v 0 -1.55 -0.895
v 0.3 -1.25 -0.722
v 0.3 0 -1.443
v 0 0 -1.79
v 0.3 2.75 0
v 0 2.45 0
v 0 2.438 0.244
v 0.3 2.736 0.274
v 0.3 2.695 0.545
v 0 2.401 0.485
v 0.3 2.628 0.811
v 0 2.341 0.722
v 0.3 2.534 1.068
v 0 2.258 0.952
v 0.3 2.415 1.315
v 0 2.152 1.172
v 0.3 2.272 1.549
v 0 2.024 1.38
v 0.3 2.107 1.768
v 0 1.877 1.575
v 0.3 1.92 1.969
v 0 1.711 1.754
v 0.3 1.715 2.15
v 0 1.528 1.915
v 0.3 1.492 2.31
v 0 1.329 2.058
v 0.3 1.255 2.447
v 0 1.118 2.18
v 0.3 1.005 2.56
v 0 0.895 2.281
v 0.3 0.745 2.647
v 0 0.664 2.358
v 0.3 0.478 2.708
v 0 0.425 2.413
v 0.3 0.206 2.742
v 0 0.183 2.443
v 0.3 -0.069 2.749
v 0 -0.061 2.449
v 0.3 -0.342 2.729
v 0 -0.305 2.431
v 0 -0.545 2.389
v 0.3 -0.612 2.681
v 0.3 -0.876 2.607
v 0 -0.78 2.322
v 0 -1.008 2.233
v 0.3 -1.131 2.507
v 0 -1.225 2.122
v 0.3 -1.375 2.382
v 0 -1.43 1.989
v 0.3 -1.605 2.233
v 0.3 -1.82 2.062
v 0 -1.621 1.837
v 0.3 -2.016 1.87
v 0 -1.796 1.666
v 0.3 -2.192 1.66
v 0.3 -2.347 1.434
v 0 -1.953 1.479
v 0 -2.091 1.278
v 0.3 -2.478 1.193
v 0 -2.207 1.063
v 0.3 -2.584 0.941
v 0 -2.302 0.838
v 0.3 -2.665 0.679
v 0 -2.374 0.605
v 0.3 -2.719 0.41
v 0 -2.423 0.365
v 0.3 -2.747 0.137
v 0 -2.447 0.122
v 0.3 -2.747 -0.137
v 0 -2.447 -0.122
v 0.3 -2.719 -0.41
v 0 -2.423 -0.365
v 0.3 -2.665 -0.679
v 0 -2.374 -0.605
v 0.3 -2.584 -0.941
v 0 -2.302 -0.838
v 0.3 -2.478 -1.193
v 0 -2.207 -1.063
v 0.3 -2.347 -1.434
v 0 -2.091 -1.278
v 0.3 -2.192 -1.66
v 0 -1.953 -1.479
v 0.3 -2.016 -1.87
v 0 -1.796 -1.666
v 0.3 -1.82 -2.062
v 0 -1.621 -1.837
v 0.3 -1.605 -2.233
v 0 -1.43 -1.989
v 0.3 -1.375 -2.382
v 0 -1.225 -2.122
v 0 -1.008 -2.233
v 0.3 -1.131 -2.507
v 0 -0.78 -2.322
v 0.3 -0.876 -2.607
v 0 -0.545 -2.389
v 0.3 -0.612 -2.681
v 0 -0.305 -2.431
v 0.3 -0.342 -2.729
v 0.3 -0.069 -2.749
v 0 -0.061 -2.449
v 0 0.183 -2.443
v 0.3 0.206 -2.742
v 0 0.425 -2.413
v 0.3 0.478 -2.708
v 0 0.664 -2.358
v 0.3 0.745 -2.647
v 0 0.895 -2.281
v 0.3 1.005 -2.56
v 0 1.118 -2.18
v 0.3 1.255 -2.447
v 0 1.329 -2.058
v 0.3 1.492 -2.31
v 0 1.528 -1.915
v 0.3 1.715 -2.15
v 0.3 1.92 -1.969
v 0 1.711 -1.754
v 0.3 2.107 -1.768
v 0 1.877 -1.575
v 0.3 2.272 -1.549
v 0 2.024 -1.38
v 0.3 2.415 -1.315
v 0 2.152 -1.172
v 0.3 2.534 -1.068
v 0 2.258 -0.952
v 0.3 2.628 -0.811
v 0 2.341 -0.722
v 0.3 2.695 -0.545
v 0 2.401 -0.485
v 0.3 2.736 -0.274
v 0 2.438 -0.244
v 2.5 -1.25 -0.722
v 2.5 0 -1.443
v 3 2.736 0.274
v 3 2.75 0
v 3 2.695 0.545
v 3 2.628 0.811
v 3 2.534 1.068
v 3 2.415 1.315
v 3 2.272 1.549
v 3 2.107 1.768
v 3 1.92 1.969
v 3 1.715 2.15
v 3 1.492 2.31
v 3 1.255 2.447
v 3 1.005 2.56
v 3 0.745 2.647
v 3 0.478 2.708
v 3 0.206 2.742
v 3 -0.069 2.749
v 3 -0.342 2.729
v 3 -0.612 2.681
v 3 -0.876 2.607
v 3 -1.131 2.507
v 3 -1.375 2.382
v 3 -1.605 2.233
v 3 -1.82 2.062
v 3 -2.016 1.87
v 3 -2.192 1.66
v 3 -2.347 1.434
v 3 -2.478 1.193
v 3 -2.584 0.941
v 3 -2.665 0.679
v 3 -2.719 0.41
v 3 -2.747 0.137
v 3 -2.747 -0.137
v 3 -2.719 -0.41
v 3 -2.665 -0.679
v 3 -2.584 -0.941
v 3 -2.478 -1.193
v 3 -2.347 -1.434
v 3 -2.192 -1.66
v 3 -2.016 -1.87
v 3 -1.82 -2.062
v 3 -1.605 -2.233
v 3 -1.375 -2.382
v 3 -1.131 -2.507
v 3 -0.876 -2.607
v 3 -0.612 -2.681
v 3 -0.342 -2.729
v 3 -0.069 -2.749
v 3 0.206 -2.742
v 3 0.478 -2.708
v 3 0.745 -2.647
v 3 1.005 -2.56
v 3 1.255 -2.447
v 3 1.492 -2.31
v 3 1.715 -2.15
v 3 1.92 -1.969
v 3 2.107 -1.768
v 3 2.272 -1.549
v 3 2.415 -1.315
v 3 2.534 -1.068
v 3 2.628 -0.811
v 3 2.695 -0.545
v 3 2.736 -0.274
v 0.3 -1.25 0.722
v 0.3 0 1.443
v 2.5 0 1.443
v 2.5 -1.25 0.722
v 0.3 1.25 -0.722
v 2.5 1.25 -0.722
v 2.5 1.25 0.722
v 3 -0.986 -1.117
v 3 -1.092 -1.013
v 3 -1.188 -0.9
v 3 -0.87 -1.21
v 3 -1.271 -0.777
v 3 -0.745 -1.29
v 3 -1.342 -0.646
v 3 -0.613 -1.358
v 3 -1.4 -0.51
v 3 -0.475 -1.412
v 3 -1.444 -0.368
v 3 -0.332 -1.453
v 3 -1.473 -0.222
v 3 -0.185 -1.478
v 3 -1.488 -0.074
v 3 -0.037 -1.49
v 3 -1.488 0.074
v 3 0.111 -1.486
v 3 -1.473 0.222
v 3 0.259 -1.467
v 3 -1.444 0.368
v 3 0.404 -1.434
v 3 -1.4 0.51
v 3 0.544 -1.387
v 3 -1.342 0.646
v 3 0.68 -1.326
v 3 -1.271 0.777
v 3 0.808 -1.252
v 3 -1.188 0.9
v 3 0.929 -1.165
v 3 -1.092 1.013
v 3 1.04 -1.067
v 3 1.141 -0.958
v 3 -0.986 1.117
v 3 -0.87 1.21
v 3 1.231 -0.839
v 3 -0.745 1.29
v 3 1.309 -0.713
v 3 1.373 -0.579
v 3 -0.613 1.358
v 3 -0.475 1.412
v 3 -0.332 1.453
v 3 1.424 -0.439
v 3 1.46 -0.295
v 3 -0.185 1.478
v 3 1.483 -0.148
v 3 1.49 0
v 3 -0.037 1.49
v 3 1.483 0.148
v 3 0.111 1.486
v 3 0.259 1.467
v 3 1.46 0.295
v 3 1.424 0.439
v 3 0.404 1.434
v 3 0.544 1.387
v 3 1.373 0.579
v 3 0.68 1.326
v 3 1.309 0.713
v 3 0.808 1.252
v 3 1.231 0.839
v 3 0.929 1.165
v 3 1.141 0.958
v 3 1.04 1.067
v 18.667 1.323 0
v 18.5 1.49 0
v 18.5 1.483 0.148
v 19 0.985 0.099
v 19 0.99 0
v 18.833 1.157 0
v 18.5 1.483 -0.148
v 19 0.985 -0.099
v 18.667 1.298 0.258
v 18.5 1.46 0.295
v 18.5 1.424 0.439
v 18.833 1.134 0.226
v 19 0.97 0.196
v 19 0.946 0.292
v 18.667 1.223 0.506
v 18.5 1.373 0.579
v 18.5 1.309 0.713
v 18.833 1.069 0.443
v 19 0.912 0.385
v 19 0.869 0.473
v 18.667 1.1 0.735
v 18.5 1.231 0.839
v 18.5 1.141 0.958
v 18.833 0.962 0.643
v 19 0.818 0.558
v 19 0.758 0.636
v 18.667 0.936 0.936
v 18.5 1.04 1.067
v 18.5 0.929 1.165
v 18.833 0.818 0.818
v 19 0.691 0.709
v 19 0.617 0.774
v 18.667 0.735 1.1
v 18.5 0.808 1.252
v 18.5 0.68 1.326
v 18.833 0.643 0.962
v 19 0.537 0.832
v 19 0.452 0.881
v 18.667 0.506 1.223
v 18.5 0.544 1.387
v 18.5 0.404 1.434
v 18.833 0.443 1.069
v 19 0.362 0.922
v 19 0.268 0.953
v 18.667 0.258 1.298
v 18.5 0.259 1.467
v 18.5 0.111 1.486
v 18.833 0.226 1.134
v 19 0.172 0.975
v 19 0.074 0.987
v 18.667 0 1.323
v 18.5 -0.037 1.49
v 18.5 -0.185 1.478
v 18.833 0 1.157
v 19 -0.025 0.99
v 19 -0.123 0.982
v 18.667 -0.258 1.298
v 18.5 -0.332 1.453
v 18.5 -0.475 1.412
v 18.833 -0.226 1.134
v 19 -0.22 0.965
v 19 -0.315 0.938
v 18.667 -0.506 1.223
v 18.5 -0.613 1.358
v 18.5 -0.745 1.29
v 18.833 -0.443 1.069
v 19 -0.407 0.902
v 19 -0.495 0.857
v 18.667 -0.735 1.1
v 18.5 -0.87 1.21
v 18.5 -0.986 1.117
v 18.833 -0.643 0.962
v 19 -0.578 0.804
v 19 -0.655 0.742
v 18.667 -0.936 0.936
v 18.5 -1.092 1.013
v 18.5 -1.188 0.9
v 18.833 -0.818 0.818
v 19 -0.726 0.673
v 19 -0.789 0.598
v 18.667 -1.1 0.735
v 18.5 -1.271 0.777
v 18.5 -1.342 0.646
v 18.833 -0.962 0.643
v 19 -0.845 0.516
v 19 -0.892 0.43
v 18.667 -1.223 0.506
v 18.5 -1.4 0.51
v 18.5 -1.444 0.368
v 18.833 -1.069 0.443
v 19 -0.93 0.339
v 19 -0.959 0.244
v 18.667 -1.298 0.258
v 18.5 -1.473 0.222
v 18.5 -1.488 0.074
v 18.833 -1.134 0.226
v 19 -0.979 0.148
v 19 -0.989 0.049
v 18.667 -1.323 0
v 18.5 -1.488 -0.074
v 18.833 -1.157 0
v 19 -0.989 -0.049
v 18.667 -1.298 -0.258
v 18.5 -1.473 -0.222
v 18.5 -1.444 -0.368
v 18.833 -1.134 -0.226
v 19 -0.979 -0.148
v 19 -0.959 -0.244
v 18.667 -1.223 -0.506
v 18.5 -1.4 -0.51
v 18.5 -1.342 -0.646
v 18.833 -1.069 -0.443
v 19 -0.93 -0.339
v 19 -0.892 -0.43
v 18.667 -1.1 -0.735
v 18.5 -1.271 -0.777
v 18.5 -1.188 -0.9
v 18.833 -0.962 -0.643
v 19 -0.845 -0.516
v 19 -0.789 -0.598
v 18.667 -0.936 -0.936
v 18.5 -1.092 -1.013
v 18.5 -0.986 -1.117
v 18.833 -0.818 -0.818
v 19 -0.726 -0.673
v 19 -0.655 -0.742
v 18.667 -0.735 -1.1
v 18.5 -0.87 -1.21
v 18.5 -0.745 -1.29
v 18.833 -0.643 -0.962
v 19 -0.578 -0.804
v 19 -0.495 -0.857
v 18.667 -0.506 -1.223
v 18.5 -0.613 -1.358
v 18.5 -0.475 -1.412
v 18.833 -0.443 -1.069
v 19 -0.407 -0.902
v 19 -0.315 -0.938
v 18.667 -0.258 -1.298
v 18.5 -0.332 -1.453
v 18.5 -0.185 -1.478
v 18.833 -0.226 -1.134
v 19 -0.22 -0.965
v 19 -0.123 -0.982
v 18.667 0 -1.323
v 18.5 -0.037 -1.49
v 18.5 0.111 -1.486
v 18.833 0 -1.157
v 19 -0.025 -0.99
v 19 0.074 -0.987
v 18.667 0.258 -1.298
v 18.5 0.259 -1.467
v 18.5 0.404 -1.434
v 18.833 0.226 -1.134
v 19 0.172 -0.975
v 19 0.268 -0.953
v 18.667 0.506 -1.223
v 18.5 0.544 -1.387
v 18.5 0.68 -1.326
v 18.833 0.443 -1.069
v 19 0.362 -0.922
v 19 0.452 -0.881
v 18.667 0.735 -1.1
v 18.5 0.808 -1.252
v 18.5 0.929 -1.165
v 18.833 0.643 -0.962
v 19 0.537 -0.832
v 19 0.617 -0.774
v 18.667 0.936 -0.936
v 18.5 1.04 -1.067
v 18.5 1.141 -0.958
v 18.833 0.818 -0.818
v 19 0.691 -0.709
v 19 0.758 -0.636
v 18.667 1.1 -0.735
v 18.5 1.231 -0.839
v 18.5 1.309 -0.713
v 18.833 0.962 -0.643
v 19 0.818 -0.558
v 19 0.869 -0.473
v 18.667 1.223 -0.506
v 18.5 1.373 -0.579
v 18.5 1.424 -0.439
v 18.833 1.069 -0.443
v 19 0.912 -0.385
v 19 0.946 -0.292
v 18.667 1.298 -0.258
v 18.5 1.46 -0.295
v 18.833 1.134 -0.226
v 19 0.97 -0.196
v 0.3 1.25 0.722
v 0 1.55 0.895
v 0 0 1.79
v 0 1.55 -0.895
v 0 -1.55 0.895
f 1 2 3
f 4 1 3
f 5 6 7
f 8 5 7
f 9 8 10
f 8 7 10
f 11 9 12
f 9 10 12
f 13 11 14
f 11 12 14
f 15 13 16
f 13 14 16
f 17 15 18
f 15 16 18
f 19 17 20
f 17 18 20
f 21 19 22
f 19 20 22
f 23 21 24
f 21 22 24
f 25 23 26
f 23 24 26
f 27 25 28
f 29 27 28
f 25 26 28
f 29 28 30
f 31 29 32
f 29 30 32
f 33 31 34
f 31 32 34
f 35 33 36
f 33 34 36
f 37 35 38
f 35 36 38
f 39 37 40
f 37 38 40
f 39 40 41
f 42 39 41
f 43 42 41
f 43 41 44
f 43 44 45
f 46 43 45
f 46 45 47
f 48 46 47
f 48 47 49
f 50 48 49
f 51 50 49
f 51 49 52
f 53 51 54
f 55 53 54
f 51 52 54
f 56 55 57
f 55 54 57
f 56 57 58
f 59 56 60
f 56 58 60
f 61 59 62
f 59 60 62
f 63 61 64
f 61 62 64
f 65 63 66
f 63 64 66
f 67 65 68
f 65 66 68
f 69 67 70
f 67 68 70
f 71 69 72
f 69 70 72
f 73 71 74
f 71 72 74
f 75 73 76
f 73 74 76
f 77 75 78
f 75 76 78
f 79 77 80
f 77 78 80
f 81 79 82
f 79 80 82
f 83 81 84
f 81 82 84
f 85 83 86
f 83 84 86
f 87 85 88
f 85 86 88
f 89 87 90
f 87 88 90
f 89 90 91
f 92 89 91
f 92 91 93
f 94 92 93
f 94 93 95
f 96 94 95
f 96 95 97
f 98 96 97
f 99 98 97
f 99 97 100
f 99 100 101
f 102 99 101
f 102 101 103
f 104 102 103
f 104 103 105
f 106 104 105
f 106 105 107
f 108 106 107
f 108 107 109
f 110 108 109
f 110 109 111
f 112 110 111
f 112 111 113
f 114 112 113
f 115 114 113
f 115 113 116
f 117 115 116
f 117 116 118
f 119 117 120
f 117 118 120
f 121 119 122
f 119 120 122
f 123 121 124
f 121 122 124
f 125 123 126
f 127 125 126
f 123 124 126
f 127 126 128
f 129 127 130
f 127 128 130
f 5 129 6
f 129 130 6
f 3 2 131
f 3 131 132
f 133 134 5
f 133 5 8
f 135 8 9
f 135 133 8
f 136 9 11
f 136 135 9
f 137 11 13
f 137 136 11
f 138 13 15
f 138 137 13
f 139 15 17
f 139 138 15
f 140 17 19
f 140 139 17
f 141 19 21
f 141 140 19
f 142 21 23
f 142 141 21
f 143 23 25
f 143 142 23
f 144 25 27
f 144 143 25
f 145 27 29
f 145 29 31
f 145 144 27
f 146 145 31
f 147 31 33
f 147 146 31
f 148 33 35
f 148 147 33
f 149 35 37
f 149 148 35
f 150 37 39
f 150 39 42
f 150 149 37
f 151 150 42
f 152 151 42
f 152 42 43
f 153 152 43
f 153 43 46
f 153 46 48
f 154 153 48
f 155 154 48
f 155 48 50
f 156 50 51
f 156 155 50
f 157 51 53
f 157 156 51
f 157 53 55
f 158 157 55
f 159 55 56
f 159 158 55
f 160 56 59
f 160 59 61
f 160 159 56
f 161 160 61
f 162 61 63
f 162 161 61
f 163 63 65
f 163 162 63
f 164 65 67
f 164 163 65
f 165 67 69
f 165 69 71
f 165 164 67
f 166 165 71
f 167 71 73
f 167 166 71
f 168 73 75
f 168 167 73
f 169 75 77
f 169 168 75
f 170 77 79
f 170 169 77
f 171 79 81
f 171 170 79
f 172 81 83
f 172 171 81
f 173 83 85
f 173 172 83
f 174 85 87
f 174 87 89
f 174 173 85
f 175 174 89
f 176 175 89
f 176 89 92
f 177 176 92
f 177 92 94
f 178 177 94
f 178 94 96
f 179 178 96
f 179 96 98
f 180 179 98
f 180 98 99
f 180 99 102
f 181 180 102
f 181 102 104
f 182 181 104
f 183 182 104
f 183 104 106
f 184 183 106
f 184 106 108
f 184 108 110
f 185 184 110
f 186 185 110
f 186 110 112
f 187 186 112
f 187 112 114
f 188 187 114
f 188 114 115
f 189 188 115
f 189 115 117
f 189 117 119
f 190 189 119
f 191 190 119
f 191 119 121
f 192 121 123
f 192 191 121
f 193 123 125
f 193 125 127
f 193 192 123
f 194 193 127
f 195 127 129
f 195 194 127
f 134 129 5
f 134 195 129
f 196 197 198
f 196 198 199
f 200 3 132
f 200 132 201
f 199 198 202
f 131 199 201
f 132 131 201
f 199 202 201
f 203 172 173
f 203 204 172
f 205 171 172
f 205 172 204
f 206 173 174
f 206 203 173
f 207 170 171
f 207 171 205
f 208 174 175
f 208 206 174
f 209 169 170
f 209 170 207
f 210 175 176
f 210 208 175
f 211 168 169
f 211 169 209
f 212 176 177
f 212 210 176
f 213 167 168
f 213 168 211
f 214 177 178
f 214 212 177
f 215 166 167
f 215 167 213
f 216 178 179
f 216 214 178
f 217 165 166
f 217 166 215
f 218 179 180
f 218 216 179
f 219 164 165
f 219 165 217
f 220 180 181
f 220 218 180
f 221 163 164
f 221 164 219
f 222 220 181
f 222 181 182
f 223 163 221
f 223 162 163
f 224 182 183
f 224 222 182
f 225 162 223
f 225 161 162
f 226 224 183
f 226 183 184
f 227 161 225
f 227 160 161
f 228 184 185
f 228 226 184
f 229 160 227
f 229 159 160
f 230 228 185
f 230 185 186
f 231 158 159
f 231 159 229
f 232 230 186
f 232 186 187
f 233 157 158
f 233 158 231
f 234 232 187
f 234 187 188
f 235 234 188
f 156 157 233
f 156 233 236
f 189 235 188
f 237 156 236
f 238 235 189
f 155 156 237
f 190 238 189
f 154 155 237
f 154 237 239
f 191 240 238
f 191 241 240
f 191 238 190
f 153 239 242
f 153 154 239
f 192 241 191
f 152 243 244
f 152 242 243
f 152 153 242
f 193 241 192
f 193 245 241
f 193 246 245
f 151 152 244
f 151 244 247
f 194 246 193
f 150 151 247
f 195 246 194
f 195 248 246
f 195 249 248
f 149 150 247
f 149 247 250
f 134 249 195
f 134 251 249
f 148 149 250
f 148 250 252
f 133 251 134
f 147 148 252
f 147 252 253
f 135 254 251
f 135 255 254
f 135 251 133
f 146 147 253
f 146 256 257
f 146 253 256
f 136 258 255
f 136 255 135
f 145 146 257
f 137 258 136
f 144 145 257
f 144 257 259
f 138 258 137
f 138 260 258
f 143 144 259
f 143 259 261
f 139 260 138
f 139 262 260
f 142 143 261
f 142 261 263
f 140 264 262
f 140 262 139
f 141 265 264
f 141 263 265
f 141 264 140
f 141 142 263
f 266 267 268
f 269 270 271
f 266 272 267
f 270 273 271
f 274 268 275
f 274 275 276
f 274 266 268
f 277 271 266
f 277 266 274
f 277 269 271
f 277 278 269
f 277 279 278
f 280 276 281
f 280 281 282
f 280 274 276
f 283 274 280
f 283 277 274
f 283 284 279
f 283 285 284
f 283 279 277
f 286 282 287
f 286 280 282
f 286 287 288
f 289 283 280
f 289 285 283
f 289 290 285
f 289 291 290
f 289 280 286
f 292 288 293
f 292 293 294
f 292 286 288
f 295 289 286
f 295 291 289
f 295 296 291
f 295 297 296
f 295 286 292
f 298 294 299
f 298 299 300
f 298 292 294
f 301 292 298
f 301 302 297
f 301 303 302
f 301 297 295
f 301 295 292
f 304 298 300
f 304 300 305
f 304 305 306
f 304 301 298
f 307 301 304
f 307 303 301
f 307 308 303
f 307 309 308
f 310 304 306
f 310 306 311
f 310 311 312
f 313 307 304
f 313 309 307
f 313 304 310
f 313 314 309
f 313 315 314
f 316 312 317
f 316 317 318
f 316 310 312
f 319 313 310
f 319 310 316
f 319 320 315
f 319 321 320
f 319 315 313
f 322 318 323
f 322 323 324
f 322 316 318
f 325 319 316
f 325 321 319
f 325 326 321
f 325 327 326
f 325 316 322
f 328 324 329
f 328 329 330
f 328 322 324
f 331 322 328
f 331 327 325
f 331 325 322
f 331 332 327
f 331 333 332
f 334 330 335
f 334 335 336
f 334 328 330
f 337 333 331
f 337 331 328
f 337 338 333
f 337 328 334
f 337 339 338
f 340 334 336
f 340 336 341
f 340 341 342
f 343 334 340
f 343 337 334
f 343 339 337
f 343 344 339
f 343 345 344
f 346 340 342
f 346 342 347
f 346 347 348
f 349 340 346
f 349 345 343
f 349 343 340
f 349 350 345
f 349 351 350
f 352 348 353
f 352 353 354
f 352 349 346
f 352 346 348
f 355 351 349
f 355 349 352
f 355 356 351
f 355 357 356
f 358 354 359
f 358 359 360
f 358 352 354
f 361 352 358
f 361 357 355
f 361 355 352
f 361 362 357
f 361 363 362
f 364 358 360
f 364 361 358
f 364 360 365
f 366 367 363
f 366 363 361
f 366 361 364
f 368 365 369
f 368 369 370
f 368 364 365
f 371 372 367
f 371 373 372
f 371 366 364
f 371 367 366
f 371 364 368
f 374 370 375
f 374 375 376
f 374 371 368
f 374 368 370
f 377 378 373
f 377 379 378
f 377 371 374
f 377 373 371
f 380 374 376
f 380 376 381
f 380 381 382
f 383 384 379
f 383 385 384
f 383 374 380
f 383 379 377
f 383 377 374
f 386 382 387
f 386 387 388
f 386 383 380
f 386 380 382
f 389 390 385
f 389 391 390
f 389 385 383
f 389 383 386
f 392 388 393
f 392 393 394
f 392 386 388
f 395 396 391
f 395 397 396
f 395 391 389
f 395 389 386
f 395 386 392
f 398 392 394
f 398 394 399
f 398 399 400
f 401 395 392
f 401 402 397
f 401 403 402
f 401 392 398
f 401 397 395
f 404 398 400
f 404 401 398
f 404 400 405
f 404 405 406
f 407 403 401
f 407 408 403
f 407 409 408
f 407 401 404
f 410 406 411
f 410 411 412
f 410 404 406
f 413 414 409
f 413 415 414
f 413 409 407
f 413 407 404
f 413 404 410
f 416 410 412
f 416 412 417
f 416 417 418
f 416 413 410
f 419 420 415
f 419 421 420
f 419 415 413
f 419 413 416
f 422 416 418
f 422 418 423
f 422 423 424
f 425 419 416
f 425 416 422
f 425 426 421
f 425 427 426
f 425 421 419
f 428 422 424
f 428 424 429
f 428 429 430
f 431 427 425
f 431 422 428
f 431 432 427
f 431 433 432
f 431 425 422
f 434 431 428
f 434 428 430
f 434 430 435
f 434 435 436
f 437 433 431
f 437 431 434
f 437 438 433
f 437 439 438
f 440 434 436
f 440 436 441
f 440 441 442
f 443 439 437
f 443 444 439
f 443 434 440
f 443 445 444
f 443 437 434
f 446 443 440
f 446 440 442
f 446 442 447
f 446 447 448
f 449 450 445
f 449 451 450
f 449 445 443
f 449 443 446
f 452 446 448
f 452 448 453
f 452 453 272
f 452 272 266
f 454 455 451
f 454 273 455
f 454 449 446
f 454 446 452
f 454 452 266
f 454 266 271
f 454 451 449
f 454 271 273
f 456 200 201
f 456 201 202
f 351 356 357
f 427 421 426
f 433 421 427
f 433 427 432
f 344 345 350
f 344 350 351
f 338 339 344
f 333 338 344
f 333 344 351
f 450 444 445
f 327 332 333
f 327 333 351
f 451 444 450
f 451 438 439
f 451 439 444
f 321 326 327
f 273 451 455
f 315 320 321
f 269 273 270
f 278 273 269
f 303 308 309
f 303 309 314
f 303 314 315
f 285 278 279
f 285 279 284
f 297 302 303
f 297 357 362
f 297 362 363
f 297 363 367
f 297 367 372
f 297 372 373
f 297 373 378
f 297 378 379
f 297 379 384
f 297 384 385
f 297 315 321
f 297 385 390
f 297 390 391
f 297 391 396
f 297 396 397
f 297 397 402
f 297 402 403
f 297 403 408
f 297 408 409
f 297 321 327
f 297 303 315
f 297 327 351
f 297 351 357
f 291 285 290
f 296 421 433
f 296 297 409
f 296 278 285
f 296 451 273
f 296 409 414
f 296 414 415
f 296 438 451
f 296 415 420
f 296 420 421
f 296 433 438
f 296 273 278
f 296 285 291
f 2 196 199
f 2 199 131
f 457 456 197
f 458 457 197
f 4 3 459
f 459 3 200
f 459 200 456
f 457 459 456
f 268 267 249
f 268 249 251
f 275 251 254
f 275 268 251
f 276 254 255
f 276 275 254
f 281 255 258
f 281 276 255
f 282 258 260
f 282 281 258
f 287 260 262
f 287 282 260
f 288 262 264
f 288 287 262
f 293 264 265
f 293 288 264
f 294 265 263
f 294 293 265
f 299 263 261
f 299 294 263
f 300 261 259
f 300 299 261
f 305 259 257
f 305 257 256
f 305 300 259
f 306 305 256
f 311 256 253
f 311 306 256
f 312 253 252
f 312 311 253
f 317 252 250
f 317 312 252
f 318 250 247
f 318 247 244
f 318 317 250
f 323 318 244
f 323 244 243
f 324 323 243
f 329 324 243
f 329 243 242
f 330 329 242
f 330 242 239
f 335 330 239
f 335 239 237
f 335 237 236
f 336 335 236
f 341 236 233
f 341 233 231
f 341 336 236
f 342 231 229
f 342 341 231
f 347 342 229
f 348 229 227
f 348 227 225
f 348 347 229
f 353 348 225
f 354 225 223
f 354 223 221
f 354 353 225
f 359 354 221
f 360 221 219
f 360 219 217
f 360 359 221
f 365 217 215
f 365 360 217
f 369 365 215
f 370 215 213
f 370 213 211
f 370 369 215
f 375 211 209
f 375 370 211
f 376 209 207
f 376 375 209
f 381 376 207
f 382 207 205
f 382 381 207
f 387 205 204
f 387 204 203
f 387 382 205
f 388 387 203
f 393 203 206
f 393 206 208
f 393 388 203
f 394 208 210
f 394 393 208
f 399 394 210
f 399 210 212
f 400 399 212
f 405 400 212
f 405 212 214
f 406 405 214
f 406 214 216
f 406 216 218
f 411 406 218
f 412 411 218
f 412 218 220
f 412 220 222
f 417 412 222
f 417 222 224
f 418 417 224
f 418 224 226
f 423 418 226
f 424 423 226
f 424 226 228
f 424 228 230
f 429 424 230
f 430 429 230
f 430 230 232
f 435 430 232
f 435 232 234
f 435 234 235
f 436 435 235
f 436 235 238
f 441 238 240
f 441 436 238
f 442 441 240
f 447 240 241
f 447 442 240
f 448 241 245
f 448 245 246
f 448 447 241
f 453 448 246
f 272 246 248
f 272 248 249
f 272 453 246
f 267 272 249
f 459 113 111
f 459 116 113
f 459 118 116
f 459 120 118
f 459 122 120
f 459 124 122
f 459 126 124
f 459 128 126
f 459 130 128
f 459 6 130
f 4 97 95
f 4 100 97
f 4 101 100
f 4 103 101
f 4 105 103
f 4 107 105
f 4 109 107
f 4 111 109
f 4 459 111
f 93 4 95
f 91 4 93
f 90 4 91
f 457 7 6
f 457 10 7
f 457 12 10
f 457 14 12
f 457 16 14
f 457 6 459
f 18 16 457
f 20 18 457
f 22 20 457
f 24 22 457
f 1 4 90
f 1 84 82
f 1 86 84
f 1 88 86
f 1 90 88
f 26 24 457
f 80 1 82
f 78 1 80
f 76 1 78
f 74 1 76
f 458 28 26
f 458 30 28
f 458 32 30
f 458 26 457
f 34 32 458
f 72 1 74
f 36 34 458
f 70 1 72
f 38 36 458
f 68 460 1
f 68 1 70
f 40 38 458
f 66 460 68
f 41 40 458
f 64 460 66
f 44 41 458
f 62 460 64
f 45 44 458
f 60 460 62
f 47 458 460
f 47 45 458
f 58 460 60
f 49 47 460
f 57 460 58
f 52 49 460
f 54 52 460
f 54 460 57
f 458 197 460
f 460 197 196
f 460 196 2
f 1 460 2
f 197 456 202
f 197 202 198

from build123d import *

# Parameters (mm, degrees)
CHAMFER1_SIZE      = 0.5
CHAMFER2_SIZE      = 0.3
CUT_EXTRUDE1_DEPTH = 2.5
CHAMFER3_SIZE      = 0.3


with BuildPart() as part:
    # Sketch1 → Revolve1 (revolve)
    with BuildSketch(Plane.XY):
        Polygon((0, 0), (0, 2.75), (3, 2.75), (3, 1.49), (19, 1.49), (19, 0), align=None)
    revolve(axis=Axis((-88.705490849, 0, 0), (1, 0, 0)))

    # Chamfer1
    chamfer1_edges = [part.edges().sort_by_distance(p)[0] for p in [
        (19, -1.49, 0),
    ]]
    chamfer(chamfer1_edges, length=CHAMFER1_SIZE)

    # Chamfer2
    chamfer2_edges = [part.edges().sort_by_distance(p)[0] for p in [
        (0, -2.75, 0),
    ]]
    chamfer(chamfer2_edges, length=CHAMFER2_SIZE)

    # Sketch3 → Cut-Extrude1 (cut)
    with BuildSketch(Plane(origin=(0, 0, 0), x_dir=(0, 0, -1), z_dir=(1, 0, 0))):
        Polygon((-1.443375673, 0), (-0.721687836, -1.25), (0.721687836, -1.25), (1.443375673, 0), (0.721687836, 1.25), (-0.721687836, 1.25), align=None)
    extrude(amount=CUT_EXTRUDE1_DEPTH, mode=Mode.SUBTRACT)

    # Chamfer3
    chamfer3_edges = [part.edges().sort_by_distance(p)[0] for p in [
        (0, 0.625, 1.082531755),
        (0, -0.625, 1.082531755),
        (0, -1.25, 0),
        (0, -0.625, -1.082531755),
        (0, 0.625, -1.082531755),
        (0, 1.25, 0),
    ]]
    chamfer(chamfer3_edges, length=CHAMFER3_SIZE)


solid = part.part
